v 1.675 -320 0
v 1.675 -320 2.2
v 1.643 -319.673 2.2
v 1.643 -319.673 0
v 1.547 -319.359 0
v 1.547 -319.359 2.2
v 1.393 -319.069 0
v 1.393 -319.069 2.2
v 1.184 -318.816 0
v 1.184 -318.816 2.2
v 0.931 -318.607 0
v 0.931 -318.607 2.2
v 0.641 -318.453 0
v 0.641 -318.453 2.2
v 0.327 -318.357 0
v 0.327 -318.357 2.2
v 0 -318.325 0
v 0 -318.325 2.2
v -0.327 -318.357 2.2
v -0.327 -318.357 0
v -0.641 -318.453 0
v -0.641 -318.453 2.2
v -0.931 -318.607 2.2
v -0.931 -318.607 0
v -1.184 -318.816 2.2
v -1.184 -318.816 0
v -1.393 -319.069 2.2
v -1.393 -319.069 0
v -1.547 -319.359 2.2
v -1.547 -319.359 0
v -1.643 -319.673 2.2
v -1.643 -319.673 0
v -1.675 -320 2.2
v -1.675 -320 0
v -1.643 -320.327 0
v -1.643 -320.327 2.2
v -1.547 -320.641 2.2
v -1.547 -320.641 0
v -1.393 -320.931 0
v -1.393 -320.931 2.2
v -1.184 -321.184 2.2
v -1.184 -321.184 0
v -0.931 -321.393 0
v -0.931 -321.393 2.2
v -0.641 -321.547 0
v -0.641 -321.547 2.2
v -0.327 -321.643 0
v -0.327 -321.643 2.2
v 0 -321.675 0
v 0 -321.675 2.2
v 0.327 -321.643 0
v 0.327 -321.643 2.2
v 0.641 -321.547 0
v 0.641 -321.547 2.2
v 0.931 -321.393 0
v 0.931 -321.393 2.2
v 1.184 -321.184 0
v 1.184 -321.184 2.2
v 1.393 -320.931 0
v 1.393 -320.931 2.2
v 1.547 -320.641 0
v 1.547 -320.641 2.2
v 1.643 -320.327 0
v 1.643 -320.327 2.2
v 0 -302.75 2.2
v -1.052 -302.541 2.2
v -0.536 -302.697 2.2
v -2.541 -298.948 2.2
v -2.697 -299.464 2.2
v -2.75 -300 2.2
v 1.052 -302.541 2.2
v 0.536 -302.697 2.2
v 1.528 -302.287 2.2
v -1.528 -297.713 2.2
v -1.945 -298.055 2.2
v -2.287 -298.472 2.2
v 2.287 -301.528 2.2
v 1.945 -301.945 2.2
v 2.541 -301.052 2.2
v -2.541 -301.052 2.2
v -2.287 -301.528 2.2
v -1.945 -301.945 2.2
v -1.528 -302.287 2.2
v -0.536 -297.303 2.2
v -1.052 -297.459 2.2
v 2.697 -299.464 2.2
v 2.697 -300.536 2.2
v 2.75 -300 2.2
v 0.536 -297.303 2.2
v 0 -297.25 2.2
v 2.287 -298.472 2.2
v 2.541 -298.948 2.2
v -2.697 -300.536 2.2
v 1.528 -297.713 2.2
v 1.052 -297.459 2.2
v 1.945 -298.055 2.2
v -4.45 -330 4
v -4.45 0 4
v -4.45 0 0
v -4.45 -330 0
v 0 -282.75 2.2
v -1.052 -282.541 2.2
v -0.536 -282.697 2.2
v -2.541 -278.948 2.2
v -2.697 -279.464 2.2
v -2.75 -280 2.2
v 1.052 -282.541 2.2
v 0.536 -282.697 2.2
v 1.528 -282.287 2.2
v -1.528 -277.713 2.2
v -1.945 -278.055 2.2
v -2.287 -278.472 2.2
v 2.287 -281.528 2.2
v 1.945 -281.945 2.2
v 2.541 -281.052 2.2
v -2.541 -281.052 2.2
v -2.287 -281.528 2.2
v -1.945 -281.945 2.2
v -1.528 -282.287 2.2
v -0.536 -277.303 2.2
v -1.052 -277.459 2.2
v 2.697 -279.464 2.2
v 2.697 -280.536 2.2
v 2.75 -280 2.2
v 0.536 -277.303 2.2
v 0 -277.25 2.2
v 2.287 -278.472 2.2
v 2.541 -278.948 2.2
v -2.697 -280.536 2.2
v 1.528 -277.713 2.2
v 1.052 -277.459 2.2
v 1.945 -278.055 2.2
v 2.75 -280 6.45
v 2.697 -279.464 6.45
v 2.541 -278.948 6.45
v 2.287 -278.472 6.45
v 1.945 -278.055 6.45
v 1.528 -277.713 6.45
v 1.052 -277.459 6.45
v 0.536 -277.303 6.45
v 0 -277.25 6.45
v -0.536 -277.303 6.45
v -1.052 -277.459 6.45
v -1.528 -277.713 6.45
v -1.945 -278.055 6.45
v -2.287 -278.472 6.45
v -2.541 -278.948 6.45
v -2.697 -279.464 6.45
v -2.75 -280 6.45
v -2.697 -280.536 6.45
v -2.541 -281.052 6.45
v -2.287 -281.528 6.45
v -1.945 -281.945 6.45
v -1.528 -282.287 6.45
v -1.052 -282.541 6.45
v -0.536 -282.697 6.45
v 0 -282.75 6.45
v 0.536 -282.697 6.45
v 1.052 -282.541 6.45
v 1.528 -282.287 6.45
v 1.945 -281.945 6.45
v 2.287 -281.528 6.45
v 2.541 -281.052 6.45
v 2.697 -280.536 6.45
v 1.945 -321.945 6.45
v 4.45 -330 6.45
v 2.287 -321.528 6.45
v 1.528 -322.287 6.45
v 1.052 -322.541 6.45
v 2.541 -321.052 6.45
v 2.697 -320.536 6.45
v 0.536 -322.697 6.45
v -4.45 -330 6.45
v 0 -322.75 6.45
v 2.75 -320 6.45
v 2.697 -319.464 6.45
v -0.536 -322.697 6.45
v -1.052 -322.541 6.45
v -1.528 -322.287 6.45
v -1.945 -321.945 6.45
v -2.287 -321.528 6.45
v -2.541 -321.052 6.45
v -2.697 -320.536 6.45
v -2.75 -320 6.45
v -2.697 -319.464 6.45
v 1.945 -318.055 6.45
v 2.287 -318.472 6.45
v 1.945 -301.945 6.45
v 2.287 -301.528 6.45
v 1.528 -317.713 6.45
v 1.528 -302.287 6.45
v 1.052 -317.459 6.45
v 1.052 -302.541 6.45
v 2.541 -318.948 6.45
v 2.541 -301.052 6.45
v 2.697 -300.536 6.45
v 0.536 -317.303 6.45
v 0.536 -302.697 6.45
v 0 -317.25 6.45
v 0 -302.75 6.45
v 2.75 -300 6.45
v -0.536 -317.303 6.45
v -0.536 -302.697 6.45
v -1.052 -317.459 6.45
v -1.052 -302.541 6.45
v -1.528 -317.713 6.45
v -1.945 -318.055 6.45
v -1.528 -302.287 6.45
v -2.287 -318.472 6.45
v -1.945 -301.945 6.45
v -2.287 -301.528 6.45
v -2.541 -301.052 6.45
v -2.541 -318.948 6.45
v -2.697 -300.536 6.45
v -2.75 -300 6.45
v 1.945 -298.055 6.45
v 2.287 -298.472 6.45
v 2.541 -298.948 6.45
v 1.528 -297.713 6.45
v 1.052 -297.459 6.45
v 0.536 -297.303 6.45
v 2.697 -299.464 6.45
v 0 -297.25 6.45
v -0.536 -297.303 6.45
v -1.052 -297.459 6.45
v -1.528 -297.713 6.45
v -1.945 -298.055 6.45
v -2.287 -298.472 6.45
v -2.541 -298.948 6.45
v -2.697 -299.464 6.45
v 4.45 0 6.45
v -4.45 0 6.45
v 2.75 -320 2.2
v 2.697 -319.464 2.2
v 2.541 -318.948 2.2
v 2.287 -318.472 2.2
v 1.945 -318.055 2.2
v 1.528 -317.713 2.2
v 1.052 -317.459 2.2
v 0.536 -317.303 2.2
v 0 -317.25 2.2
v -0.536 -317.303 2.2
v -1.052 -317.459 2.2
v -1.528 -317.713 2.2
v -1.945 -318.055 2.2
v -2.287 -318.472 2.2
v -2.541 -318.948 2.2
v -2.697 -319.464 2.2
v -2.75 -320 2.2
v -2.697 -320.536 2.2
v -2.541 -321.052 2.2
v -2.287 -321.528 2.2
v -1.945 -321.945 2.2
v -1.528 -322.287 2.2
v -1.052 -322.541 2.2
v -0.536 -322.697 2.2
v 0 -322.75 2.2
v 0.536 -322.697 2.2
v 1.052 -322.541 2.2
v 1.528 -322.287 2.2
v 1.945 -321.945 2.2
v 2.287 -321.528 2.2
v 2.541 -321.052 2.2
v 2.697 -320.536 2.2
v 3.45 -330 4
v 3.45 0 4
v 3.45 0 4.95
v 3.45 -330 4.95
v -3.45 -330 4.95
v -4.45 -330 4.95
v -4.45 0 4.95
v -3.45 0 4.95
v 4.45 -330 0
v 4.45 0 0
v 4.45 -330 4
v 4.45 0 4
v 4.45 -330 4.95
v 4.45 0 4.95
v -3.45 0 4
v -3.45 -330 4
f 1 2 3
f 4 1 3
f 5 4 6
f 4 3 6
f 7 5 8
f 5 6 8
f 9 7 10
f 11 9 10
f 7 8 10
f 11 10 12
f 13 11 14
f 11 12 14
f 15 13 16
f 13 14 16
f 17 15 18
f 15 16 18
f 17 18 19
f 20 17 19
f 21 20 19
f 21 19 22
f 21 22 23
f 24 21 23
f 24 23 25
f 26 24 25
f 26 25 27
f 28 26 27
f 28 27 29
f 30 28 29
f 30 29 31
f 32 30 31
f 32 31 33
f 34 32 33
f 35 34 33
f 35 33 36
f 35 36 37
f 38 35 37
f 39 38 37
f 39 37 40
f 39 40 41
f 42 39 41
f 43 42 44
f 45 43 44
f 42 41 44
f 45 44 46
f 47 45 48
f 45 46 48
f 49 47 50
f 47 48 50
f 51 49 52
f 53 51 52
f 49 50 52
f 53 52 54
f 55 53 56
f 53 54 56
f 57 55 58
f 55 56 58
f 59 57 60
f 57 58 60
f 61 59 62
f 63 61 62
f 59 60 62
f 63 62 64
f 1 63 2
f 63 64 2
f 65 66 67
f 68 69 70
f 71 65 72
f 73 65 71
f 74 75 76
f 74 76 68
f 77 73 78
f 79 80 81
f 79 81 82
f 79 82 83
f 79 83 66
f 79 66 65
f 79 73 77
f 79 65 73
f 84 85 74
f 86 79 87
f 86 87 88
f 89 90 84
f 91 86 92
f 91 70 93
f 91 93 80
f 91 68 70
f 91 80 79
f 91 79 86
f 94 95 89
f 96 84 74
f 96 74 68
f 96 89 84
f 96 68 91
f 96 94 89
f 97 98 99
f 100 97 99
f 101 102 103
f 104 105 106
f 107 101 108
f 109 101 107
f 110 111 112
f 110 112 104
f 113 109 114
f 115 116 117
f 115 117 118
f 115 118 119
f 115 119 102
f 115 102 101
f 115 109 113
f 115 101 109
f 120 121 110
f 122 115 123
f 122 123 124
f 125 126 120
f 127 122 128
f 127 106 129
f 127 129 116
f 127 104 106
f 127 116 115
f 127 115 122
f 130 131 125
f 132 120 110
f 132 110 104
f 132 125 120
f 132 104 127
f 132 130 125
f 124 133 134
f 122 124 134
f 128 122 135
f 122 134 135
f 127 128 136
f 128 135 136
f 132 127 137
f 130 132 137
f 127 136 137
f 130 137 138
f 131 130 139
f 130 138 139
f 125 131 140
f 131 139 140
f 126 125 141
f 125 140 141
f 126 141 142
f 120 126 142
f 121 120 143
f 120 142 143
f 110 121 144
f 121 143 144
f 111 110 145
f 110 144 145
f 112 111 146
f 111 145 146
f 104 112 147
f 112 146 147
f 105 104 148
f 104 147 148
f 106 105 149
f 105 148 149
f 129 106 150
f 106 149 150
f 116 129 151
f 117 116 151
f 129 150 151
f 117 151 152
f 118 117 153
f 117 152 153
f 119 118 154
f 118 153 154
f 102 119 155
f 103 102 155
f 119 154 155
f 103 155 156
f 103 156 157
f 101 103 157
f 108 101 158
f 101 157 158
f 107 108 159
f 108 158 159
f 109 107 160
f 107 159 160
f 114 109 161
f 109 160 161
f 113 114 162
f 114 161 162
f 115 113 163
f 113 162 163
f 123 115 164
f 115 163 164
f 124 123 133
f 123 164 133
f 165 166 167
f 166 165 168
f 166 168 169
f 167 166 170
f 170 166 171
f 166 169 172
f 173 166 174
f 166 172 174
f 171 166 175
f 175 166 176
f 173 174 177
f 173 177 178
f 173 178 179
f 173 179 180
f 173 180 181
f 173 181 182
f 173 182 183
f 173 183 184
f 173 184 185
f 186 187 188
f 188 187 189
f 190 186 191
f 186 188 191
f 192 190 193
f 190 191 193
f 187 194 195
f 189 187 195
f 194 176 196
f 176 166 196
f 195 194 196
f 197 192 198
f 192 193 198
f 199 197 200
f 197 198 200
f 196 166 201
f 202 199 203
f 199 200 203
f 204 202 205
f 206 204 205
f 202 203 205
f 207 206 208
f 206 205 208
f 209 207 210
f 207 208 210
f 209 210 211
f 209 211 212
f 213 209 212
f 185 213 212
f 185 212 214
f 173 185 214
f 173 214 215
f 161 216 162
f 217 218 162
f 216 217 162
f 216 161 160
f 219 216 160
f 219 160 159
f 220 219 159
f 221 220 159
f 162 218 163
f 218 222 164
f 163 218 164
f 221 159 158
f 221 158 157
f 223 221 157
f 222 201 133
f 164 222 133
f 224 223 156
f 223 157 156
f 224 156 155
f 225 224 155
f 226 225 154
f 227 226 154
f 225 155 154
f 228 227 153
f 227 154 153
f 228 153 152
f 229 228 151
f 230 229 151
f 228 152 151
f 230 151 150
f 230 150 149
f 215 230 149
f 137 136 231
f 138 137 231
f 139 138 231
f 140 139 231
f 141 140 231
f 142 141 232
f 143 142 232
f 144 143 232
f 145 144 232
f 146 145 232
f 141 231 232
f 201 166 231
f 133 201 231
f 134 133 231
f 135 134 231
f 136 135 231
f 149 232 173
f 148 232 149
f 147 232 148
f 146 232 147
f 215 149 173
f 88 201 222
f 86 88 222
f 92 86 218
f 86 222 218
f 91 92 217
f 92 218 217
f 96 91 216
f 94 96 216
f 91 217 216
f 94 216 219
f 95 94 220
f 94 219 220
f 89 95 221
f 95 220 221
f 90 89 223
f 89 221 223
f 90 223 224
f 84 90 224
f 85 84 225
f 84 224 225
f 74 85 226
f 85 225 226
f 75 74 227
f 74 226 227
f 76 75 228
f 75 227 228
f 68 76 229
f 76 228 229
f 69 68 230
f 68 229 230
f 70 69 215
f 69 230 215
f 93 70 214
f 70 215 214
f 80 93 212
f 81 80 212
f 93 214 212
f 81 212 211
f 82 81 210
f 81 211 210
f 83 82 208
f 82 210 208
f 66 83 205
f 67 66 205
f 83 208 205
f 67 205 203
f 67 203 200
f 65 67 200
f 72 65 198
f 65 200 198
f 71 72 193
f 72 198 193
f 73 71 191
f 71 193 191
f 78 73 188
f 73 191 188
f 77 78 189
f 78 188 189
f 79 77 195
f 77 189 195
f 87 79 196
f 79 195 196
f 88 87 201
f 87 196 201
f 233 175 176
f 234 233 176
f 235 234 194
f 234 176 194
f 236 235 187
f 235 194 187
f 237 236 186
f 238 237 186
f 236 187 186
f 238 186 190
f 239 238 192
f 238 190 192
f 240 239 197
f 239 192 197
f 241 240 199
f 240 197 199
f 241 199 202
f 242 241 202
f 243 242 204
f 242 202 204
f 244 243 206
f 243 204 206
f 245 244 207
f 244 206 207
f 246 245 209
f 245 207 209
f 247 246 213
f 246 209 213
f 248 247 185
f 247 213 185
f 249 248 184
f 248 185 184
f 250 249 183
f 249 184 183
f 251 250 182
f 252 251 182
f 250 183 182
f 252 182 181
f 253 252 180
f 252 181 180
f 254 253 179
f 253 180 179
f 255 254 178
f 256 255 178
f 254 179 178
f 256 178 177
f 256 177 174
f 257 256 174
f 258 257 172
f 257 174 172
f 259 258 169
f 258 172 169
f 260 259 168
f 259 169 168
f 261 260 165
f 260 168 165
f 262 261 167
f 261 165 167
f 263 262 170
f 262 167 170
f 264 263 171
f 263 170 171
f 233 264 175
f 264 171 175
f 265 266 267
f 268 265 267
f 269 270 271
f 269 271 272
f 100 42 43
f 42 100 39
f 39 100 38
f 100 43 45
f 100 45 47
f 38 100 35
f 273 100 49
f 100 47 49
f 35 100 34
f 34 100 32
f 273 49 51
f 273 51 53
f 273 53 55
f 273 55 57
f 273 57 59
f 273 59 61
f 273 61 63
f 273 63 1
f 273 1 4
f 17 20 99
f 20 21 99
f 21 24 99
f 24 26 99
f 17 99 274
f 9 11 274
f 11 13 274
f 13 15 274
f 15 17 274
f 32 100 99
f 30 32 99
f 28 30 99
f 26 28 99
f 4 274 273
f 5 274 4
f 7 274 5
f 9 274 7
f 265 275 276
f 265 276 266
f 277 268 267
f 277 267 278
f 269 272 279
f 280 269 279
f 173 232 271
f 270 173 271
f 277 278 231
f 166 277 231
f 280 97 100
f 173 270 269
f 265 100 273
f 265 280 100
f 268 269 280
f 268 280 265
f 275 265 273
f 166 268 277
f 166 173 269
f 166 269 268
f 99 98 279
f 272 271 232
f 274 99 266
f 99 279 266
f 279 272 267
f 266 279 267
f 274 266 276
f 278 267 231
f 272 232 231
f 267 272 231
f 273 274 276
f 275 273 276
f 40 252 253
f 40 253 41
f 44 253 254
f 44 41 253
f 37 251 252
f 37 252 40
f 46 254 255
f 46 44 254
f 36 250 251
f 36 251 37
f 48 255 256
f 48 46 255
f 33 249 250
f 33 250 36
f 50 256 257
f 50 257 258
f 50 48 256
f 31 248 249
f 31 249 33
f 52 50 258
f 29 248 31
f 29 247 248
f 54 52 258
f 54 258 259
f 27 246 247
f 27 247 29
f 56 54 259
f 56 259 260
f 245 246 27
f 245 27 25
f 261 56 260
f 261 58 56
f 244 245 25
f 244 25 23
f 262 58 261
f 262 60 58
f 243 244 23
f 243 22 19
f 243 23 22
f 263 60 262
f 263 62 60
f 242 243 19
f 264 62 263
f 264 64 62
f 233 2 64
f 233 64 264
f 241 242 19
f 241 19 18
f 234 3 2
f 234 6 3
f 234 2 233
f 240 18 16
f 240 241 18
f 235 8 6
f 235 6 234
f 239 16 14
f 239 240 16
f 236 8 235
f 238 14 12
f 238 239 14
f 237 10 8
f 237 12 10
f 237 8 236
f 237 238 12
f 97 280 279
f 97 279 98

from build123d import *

# Parameters (mm, degrees)
F1_DEPTH = 330
F2_R     = 2.75
F3_DEPTH = 4.25
F4_R     = 1.675
F5_DEPTH = 2.201


with BuildPart() as f1:
    # F0 (on Front) → F1 (new body)
    with BuildSketch(Plane.XZ):
        Polygon((-4.45, 4), (-4.45, 0), (4.45, 0), (4.45, 4), (3.45, 4), (3.45, 4.95), (4.45, 4.95), (4.45, 6.45), (-4.45, 6.45), (-4.45, 4.95), (-3.45, 4.95), (-3.45, 4), align=None)
    extrude(amount=F1_DEPTH)

    # F2 (on face) → F3 (cut)
    with BuildSketch(Plane.XY.offset(6.45)):
        with Locations((0, -320)):
            Circle(F2_R)
        with Locations((0, -300)):
            Circle(F2_R)
        with Locations((0, -280)):
            Circle(F2_R)
    extrude(amount=-F3_DEPTH, mode=Mode.SUBTRACT)

    # F4 (on face) → F5 (cut, through all)
    with BuildSketch(Plane.XY.offset(2.2)):
        with Locations((0, -320)):
            Circle(F4_R)
    extrude(amount=-F5_DEPTH, mode=Mode.SUBTRACT)


solid = f1.part
